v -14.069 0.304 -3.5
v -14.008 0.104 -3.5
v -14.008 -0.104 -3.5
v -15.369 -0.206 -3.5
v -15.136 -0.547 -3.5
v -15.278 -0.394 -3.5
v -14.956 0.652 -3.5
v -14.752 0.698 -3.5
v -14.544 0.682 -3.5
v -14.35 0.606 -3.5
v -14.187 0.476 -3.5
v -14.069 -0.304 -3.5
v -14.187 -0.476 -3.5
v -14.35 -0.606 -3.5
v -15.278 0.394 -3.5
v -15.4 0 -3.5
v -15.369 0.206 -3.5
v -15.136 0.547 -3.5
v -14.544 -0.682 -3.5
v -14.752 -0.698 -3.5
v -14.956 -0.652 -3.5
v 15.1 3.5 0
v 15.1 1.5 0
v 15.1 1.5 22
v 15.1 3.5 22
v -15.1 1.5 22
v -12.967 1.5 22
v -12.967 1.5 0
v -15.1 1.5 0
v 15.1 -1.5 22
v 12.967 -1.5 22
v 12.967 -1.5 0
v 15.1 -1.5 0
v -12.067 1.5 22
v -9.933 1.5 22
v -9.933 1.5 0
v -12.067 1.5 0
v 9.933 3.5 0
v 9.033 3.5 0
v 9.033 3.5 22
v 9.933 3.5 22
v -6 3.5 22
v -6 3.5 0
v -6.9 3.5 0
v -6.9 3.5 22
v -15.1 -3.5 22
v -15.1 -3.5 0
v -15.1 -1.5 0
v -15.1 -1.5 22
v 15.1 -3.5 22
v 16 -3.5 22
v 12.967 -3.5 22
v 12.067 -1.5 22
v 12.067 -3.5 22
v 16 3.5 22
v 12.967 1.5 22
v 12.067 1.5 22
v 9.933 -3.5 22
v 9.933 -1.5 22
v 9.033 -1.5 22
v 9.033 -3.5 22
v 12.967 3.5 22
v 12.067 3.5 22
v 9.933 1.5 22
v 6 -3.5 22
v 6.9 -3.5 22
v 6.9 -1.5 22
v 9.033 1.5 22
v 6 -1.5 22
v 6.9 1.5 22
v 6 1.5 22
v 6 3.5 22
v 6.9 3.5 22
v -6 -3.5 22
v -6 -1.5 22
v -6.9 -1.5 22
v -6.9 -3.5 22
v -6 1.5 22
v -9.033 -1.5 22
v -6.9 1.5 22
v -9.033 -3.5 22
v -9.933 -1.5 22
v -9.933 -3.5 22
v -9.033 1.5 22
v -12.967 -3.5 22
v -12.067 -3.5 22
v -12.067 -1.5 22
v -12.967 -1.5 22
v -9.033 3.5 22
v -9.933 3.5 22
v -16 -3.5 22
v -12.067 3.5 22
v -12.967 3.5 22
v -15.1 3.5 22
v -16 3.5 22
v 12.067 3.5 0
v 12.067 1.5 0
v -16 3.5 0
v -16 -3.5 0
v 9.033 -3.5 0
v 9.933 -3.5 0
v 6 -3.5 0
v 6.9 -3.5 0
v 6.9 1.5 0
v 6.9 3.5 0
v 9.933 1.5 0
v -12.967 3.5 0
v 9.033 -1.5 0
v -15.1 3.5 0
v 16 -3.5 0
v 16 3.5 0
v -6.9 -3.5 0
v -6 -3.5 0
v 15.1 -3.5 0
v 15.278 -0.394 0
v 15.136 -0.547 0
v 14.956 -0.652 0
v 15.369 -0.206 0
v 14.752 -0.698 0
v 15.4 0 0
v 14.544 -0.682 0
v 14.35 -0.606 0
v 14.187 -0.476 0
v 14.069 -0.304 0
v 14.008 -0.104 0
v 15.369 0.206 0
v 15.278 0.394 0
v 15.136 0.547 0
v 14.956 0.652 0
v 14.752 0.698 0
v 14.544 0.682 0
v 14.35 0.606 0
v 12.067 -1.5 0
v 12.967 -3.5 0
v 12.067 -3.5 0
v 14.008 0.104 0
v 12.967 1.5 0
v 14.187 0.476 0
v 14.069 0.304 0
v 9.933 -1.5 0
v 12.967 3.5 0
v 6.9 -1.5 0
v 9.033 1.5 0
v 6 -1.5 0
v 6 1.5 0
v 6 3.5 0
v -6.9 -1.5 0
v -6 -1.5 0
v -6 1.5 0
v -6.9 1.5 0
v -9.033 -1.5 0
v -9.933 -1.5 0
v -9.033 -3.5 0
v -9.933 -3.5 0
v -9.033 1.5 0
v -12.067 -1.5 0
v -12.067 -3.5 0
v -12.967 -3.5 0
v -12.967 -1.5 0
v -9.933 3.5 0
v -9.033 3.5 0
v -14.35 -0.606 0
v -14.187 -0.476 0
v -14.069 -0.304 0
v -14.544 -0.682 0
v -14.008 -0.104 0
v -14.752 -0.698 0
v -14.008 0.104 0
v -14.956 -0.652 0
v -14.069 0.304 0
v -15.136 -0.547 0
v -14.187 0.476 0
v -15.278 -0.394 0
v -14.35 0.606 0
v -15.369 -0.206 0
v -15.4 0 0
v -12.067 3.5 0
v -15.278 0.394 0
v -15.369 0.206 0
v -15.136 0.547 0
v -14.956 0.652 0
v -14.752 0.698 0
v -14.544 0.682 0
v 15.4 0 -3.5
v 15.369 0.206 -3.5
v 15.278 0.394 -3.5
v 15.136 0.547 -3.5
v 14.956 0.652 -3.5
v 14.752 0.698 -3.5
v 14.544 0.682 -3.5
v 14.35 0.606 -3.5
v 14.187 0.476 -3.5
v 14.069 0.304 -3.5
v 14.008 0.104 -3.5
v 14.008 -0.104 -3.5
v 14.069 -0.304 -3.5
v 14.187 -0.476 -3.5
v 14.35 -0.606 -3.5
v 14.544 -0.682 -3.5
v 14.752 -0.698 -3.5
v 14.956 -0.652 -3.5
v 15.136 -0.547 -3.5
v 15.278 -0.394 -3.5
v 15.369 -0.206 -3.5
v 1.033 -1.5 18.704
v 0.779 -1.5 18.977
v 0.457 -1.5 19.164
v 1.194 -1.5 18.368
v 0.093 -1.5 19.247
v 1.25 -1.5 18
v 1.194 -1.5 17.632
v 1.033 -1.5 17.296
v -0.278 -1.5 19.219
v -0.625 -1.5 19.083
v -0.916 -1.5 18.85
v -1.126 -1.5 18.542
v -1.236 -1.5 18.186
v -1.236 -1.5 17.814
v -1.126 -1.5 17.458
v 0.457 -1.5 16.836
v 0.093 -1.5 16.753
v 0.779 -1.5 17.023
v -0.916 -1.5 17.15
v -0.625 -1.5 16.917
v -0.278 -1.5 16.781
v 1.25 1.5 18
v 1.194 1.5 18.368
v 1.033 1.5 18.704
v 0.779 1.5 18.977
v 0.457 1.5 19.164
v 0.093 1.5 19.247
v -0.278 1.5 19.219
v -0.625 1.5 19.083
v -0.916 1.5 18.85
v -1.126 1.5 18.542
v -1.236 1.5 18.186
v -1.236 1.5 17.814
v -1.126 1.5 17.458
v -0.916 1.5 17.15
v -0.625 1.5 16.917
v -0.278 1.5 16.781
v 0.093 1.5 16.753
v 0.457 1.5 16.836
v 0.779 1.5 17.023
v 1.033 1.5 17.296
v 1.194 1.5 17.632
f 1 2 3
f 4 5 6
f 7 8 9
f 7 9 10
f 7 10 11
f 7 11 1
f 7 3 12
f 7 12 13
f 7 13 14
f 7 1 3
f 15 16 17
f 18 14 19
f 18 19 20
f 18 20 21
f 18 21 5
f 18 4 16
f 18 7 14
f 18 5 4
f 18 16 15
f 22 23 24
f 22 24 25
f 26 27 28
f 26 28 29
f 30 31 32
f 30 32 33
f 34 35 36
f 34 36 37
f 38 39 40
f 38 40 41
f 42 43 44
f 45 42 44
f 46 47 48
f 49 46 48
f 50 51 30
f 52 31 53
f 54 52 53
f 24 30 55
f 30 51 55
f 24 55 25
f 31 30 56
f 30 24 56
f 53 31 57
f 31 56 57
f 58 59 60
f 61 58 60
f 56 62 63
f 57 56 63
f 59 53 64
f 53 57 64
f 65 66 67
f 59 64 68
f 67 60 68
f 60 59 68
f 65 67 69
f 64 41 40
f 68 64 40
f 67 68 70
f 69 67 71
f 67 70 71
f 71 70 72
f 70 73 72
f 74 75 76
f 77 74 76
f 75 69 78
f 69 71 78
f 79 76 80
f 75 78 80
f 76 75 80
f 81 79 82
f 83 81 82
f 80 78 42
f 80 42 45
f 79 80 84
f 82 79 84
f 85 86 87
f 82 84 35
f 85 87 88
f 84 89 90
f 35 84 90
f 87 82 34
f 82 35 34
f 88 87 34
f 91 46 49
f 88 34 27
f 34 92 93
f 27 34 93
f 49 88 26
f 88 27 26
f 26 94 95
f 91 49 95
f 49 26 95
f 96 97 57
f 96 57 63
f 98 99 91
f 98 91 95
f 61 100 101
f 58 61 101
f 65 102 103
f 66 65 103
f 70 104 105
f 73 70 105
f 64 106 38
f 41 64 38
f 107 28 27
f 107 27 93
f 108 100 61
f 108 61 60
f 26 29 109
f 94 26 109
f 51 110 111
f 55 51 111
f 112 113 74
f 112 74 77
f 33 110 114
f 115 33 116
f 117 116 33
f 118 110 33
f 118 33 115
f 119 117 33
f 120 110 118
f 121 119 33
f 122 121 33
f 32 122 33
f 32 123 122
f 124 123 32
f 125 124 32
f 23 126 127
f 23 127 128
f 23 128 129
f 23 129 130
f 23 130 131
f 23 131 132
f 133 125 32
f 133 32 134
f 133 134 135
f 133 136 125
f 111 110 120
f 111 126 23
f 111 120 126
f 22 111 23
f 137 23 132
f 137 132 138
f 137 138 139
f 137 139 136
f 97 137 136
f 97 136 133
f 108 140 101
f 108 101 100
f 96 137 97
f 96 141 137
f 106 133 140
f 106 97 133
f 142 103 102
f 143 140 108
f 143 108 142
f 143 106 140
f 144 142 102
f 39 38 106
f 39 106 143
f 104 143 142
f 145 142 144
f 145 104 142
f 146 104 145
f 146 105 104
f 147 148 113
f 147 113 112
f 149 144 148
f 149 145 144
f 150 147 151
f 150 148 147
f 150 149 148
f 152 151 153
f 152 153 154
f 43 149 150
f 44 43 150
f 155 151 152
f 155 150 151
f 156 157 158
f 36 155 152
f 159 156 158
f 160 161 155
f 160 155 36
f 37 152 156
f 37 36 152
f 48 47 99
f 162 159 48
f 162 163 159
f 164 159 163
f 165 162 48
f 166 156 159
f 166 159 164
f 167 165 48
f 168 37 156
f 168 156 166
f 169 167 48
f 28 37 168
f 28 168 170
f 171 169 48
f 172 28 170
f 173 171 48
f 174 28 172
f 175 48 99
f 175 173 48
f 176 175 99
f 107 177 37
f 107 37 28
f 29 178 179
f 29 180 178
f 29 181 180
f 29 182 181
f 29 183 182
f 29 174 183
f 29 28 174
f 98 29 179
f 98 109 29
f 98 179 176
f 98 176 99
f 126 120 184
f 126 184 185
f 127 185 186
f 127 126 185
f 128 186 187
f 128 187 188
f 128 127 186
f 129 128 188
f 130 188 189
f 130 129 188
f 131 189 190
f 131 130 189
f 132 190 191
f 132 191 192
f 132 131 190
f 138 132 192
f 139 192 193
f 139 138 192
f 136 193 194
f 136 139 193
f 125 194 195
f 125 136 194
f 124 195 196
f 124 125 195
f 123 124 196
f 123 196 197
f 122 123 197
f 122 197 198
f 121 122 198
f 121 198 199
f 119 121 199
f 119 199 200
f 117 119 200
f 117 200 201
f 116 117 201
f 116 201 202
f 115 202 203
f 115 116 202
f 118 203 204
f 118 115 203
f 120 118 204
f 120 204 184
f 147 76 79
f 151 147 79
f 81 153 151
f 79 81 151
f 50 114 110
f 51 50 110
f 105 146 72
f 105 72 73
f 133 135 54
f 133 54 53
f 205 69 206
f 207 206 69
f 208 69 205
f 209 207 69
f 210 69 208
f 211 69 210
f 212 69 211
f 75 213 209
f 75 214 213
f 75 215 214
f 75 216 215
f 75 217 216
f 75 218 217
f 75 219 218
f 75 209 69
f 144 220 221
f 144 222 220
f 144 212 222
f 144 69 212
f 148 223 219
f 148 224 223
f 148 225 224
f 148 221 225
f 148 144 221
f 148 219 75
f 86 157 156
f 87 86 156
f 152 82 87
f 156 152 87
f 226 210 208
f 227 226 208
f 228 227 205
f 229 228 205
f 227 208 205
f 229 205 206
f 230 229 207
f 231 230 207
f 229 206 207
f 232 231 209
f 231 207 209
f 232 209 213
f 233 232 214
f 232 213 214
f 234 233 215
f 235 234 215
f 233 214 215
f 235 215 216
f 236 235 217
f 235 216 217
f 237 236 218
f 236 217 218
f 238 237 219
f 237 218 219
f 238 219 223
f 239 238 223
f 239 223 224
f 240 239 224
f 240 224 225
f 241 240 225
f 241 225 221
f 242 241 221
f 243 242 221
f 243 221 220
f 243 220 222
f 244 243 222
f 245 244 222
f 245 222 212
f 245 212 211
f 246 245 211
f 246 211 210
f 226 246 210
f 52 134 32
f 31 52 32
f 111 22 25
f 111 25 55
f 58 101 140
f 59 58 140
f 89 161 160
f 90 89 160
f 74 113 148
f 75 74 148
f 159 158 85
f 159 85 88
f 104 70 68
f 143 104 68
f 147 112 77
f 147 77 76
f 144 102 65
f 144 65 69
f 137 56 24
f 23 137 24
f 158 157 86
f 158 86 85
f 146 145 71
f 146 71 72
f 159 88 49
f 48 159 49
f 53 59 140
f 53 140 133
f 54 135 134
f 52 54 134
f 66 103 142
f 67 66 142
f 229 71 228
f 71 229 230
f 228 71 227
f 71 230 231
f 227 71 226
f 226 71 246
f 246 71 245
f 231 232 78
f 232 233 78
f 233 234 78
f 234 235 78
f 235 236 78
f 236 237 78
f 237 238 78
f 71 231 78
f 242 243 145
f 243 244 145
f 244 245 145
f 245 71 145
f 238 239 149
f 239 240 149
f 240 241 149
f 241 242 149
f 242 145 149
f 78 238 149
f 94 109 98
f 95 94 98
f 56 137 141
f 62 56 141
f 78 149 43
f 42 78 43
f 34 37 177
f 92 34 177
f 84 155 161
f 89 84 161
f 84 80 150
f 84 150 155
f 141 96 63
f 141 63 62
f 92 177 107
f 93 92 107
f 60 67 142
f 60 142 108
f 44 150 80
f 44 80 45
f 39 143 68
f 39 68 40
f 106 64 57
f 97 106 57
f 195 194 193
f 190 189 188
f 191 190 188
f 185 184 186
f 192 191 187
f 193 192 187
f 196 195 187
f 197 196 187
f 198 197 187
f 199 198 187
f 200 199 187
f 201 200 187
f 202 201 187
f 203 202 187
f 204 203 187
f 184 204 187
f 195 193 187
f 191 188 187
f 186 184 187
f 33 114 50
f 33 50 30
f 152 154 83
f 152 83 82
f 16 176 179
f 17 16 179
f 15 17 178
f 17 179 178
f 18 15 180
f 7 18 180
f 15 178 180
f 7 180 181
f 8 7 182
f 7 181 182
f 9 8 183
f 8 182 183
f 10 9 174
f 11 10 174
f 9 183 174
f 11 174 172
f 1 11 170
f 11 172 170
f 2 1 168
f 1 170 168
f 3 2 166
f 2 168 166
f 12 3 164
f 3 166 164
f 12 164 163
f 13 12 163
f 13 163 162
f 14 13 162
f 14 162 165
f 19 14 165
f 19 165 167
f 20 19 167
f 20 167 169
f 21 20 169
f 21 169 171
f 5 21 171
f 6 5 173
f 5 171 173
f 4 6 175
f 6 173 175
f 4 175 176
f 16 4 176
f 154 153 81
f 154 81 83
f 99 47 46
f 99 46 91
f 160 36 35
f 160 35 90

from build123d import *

# Parameters (mm, degrees)
SKETCH001_W   = 16
SKETCH001_H   = 3
SKETCH001_W_2 = 0.9
SKETCH001_H_2 = 7
PAD_DEPTH     = 22
SKETCH_R      = 0.7
PAD001_DEPTH  = 3.5
SKETCH002_R   = 1.25
HOLE_DEPTH    = 5.001


with BuildPart() as body001:
    # Sketch001 → Pad (new body)
    with BuildSketch(Plane.XY):
        with Locations((8, 0)):
            Rectangle(SKETCH001_W, SKETCH001_H)
        with Locations((15.55, 0)):
            Rectangle(SKETCH001_W_2, SKETCH001_H_2)
        with Locations((12.516667, 0)):
            Rectangle(SKETCH001_W_2, SKETCH001_H_2)
        with Locations((6.45, 0)):
            Rectangle(SKETCH001_W_2, SKETCH001_H_2)
        with Locations((9.483333, 0)):
            Rectangle(SKETCH001_W_2, SKETCH001_H_2)
    extrude(amount=PAD_DEPTH)


with BuildPart() as pin:
    # Sketch → Pad001 (new body)
    with BuildSketch(Plane.XY):
        with Locations((14.7, 0)):
            Circle(SKETCH_R)
    extrude(amount=-PAD001_DEPTH)

    # Boolean: union Body001
    add(body001.part)

    # Mirrored: Pin across YZ


with BuildPart() as pin_1:
    add(pin.part)
    add(pin.part.mirror(Plane.YZ))

    # Sketch002 (on Face65 of Mirrored) → Hole (cut, through all)
    with BuildSketch(Plane.XZ.offset(1.5)):
        with Locations((0, 18)):
            Circle(SKETCH002_R)
    extrude(amount=-HOLE_DEPTH, mode=Mode.SUBTRACT)


solid = pin_1.part
